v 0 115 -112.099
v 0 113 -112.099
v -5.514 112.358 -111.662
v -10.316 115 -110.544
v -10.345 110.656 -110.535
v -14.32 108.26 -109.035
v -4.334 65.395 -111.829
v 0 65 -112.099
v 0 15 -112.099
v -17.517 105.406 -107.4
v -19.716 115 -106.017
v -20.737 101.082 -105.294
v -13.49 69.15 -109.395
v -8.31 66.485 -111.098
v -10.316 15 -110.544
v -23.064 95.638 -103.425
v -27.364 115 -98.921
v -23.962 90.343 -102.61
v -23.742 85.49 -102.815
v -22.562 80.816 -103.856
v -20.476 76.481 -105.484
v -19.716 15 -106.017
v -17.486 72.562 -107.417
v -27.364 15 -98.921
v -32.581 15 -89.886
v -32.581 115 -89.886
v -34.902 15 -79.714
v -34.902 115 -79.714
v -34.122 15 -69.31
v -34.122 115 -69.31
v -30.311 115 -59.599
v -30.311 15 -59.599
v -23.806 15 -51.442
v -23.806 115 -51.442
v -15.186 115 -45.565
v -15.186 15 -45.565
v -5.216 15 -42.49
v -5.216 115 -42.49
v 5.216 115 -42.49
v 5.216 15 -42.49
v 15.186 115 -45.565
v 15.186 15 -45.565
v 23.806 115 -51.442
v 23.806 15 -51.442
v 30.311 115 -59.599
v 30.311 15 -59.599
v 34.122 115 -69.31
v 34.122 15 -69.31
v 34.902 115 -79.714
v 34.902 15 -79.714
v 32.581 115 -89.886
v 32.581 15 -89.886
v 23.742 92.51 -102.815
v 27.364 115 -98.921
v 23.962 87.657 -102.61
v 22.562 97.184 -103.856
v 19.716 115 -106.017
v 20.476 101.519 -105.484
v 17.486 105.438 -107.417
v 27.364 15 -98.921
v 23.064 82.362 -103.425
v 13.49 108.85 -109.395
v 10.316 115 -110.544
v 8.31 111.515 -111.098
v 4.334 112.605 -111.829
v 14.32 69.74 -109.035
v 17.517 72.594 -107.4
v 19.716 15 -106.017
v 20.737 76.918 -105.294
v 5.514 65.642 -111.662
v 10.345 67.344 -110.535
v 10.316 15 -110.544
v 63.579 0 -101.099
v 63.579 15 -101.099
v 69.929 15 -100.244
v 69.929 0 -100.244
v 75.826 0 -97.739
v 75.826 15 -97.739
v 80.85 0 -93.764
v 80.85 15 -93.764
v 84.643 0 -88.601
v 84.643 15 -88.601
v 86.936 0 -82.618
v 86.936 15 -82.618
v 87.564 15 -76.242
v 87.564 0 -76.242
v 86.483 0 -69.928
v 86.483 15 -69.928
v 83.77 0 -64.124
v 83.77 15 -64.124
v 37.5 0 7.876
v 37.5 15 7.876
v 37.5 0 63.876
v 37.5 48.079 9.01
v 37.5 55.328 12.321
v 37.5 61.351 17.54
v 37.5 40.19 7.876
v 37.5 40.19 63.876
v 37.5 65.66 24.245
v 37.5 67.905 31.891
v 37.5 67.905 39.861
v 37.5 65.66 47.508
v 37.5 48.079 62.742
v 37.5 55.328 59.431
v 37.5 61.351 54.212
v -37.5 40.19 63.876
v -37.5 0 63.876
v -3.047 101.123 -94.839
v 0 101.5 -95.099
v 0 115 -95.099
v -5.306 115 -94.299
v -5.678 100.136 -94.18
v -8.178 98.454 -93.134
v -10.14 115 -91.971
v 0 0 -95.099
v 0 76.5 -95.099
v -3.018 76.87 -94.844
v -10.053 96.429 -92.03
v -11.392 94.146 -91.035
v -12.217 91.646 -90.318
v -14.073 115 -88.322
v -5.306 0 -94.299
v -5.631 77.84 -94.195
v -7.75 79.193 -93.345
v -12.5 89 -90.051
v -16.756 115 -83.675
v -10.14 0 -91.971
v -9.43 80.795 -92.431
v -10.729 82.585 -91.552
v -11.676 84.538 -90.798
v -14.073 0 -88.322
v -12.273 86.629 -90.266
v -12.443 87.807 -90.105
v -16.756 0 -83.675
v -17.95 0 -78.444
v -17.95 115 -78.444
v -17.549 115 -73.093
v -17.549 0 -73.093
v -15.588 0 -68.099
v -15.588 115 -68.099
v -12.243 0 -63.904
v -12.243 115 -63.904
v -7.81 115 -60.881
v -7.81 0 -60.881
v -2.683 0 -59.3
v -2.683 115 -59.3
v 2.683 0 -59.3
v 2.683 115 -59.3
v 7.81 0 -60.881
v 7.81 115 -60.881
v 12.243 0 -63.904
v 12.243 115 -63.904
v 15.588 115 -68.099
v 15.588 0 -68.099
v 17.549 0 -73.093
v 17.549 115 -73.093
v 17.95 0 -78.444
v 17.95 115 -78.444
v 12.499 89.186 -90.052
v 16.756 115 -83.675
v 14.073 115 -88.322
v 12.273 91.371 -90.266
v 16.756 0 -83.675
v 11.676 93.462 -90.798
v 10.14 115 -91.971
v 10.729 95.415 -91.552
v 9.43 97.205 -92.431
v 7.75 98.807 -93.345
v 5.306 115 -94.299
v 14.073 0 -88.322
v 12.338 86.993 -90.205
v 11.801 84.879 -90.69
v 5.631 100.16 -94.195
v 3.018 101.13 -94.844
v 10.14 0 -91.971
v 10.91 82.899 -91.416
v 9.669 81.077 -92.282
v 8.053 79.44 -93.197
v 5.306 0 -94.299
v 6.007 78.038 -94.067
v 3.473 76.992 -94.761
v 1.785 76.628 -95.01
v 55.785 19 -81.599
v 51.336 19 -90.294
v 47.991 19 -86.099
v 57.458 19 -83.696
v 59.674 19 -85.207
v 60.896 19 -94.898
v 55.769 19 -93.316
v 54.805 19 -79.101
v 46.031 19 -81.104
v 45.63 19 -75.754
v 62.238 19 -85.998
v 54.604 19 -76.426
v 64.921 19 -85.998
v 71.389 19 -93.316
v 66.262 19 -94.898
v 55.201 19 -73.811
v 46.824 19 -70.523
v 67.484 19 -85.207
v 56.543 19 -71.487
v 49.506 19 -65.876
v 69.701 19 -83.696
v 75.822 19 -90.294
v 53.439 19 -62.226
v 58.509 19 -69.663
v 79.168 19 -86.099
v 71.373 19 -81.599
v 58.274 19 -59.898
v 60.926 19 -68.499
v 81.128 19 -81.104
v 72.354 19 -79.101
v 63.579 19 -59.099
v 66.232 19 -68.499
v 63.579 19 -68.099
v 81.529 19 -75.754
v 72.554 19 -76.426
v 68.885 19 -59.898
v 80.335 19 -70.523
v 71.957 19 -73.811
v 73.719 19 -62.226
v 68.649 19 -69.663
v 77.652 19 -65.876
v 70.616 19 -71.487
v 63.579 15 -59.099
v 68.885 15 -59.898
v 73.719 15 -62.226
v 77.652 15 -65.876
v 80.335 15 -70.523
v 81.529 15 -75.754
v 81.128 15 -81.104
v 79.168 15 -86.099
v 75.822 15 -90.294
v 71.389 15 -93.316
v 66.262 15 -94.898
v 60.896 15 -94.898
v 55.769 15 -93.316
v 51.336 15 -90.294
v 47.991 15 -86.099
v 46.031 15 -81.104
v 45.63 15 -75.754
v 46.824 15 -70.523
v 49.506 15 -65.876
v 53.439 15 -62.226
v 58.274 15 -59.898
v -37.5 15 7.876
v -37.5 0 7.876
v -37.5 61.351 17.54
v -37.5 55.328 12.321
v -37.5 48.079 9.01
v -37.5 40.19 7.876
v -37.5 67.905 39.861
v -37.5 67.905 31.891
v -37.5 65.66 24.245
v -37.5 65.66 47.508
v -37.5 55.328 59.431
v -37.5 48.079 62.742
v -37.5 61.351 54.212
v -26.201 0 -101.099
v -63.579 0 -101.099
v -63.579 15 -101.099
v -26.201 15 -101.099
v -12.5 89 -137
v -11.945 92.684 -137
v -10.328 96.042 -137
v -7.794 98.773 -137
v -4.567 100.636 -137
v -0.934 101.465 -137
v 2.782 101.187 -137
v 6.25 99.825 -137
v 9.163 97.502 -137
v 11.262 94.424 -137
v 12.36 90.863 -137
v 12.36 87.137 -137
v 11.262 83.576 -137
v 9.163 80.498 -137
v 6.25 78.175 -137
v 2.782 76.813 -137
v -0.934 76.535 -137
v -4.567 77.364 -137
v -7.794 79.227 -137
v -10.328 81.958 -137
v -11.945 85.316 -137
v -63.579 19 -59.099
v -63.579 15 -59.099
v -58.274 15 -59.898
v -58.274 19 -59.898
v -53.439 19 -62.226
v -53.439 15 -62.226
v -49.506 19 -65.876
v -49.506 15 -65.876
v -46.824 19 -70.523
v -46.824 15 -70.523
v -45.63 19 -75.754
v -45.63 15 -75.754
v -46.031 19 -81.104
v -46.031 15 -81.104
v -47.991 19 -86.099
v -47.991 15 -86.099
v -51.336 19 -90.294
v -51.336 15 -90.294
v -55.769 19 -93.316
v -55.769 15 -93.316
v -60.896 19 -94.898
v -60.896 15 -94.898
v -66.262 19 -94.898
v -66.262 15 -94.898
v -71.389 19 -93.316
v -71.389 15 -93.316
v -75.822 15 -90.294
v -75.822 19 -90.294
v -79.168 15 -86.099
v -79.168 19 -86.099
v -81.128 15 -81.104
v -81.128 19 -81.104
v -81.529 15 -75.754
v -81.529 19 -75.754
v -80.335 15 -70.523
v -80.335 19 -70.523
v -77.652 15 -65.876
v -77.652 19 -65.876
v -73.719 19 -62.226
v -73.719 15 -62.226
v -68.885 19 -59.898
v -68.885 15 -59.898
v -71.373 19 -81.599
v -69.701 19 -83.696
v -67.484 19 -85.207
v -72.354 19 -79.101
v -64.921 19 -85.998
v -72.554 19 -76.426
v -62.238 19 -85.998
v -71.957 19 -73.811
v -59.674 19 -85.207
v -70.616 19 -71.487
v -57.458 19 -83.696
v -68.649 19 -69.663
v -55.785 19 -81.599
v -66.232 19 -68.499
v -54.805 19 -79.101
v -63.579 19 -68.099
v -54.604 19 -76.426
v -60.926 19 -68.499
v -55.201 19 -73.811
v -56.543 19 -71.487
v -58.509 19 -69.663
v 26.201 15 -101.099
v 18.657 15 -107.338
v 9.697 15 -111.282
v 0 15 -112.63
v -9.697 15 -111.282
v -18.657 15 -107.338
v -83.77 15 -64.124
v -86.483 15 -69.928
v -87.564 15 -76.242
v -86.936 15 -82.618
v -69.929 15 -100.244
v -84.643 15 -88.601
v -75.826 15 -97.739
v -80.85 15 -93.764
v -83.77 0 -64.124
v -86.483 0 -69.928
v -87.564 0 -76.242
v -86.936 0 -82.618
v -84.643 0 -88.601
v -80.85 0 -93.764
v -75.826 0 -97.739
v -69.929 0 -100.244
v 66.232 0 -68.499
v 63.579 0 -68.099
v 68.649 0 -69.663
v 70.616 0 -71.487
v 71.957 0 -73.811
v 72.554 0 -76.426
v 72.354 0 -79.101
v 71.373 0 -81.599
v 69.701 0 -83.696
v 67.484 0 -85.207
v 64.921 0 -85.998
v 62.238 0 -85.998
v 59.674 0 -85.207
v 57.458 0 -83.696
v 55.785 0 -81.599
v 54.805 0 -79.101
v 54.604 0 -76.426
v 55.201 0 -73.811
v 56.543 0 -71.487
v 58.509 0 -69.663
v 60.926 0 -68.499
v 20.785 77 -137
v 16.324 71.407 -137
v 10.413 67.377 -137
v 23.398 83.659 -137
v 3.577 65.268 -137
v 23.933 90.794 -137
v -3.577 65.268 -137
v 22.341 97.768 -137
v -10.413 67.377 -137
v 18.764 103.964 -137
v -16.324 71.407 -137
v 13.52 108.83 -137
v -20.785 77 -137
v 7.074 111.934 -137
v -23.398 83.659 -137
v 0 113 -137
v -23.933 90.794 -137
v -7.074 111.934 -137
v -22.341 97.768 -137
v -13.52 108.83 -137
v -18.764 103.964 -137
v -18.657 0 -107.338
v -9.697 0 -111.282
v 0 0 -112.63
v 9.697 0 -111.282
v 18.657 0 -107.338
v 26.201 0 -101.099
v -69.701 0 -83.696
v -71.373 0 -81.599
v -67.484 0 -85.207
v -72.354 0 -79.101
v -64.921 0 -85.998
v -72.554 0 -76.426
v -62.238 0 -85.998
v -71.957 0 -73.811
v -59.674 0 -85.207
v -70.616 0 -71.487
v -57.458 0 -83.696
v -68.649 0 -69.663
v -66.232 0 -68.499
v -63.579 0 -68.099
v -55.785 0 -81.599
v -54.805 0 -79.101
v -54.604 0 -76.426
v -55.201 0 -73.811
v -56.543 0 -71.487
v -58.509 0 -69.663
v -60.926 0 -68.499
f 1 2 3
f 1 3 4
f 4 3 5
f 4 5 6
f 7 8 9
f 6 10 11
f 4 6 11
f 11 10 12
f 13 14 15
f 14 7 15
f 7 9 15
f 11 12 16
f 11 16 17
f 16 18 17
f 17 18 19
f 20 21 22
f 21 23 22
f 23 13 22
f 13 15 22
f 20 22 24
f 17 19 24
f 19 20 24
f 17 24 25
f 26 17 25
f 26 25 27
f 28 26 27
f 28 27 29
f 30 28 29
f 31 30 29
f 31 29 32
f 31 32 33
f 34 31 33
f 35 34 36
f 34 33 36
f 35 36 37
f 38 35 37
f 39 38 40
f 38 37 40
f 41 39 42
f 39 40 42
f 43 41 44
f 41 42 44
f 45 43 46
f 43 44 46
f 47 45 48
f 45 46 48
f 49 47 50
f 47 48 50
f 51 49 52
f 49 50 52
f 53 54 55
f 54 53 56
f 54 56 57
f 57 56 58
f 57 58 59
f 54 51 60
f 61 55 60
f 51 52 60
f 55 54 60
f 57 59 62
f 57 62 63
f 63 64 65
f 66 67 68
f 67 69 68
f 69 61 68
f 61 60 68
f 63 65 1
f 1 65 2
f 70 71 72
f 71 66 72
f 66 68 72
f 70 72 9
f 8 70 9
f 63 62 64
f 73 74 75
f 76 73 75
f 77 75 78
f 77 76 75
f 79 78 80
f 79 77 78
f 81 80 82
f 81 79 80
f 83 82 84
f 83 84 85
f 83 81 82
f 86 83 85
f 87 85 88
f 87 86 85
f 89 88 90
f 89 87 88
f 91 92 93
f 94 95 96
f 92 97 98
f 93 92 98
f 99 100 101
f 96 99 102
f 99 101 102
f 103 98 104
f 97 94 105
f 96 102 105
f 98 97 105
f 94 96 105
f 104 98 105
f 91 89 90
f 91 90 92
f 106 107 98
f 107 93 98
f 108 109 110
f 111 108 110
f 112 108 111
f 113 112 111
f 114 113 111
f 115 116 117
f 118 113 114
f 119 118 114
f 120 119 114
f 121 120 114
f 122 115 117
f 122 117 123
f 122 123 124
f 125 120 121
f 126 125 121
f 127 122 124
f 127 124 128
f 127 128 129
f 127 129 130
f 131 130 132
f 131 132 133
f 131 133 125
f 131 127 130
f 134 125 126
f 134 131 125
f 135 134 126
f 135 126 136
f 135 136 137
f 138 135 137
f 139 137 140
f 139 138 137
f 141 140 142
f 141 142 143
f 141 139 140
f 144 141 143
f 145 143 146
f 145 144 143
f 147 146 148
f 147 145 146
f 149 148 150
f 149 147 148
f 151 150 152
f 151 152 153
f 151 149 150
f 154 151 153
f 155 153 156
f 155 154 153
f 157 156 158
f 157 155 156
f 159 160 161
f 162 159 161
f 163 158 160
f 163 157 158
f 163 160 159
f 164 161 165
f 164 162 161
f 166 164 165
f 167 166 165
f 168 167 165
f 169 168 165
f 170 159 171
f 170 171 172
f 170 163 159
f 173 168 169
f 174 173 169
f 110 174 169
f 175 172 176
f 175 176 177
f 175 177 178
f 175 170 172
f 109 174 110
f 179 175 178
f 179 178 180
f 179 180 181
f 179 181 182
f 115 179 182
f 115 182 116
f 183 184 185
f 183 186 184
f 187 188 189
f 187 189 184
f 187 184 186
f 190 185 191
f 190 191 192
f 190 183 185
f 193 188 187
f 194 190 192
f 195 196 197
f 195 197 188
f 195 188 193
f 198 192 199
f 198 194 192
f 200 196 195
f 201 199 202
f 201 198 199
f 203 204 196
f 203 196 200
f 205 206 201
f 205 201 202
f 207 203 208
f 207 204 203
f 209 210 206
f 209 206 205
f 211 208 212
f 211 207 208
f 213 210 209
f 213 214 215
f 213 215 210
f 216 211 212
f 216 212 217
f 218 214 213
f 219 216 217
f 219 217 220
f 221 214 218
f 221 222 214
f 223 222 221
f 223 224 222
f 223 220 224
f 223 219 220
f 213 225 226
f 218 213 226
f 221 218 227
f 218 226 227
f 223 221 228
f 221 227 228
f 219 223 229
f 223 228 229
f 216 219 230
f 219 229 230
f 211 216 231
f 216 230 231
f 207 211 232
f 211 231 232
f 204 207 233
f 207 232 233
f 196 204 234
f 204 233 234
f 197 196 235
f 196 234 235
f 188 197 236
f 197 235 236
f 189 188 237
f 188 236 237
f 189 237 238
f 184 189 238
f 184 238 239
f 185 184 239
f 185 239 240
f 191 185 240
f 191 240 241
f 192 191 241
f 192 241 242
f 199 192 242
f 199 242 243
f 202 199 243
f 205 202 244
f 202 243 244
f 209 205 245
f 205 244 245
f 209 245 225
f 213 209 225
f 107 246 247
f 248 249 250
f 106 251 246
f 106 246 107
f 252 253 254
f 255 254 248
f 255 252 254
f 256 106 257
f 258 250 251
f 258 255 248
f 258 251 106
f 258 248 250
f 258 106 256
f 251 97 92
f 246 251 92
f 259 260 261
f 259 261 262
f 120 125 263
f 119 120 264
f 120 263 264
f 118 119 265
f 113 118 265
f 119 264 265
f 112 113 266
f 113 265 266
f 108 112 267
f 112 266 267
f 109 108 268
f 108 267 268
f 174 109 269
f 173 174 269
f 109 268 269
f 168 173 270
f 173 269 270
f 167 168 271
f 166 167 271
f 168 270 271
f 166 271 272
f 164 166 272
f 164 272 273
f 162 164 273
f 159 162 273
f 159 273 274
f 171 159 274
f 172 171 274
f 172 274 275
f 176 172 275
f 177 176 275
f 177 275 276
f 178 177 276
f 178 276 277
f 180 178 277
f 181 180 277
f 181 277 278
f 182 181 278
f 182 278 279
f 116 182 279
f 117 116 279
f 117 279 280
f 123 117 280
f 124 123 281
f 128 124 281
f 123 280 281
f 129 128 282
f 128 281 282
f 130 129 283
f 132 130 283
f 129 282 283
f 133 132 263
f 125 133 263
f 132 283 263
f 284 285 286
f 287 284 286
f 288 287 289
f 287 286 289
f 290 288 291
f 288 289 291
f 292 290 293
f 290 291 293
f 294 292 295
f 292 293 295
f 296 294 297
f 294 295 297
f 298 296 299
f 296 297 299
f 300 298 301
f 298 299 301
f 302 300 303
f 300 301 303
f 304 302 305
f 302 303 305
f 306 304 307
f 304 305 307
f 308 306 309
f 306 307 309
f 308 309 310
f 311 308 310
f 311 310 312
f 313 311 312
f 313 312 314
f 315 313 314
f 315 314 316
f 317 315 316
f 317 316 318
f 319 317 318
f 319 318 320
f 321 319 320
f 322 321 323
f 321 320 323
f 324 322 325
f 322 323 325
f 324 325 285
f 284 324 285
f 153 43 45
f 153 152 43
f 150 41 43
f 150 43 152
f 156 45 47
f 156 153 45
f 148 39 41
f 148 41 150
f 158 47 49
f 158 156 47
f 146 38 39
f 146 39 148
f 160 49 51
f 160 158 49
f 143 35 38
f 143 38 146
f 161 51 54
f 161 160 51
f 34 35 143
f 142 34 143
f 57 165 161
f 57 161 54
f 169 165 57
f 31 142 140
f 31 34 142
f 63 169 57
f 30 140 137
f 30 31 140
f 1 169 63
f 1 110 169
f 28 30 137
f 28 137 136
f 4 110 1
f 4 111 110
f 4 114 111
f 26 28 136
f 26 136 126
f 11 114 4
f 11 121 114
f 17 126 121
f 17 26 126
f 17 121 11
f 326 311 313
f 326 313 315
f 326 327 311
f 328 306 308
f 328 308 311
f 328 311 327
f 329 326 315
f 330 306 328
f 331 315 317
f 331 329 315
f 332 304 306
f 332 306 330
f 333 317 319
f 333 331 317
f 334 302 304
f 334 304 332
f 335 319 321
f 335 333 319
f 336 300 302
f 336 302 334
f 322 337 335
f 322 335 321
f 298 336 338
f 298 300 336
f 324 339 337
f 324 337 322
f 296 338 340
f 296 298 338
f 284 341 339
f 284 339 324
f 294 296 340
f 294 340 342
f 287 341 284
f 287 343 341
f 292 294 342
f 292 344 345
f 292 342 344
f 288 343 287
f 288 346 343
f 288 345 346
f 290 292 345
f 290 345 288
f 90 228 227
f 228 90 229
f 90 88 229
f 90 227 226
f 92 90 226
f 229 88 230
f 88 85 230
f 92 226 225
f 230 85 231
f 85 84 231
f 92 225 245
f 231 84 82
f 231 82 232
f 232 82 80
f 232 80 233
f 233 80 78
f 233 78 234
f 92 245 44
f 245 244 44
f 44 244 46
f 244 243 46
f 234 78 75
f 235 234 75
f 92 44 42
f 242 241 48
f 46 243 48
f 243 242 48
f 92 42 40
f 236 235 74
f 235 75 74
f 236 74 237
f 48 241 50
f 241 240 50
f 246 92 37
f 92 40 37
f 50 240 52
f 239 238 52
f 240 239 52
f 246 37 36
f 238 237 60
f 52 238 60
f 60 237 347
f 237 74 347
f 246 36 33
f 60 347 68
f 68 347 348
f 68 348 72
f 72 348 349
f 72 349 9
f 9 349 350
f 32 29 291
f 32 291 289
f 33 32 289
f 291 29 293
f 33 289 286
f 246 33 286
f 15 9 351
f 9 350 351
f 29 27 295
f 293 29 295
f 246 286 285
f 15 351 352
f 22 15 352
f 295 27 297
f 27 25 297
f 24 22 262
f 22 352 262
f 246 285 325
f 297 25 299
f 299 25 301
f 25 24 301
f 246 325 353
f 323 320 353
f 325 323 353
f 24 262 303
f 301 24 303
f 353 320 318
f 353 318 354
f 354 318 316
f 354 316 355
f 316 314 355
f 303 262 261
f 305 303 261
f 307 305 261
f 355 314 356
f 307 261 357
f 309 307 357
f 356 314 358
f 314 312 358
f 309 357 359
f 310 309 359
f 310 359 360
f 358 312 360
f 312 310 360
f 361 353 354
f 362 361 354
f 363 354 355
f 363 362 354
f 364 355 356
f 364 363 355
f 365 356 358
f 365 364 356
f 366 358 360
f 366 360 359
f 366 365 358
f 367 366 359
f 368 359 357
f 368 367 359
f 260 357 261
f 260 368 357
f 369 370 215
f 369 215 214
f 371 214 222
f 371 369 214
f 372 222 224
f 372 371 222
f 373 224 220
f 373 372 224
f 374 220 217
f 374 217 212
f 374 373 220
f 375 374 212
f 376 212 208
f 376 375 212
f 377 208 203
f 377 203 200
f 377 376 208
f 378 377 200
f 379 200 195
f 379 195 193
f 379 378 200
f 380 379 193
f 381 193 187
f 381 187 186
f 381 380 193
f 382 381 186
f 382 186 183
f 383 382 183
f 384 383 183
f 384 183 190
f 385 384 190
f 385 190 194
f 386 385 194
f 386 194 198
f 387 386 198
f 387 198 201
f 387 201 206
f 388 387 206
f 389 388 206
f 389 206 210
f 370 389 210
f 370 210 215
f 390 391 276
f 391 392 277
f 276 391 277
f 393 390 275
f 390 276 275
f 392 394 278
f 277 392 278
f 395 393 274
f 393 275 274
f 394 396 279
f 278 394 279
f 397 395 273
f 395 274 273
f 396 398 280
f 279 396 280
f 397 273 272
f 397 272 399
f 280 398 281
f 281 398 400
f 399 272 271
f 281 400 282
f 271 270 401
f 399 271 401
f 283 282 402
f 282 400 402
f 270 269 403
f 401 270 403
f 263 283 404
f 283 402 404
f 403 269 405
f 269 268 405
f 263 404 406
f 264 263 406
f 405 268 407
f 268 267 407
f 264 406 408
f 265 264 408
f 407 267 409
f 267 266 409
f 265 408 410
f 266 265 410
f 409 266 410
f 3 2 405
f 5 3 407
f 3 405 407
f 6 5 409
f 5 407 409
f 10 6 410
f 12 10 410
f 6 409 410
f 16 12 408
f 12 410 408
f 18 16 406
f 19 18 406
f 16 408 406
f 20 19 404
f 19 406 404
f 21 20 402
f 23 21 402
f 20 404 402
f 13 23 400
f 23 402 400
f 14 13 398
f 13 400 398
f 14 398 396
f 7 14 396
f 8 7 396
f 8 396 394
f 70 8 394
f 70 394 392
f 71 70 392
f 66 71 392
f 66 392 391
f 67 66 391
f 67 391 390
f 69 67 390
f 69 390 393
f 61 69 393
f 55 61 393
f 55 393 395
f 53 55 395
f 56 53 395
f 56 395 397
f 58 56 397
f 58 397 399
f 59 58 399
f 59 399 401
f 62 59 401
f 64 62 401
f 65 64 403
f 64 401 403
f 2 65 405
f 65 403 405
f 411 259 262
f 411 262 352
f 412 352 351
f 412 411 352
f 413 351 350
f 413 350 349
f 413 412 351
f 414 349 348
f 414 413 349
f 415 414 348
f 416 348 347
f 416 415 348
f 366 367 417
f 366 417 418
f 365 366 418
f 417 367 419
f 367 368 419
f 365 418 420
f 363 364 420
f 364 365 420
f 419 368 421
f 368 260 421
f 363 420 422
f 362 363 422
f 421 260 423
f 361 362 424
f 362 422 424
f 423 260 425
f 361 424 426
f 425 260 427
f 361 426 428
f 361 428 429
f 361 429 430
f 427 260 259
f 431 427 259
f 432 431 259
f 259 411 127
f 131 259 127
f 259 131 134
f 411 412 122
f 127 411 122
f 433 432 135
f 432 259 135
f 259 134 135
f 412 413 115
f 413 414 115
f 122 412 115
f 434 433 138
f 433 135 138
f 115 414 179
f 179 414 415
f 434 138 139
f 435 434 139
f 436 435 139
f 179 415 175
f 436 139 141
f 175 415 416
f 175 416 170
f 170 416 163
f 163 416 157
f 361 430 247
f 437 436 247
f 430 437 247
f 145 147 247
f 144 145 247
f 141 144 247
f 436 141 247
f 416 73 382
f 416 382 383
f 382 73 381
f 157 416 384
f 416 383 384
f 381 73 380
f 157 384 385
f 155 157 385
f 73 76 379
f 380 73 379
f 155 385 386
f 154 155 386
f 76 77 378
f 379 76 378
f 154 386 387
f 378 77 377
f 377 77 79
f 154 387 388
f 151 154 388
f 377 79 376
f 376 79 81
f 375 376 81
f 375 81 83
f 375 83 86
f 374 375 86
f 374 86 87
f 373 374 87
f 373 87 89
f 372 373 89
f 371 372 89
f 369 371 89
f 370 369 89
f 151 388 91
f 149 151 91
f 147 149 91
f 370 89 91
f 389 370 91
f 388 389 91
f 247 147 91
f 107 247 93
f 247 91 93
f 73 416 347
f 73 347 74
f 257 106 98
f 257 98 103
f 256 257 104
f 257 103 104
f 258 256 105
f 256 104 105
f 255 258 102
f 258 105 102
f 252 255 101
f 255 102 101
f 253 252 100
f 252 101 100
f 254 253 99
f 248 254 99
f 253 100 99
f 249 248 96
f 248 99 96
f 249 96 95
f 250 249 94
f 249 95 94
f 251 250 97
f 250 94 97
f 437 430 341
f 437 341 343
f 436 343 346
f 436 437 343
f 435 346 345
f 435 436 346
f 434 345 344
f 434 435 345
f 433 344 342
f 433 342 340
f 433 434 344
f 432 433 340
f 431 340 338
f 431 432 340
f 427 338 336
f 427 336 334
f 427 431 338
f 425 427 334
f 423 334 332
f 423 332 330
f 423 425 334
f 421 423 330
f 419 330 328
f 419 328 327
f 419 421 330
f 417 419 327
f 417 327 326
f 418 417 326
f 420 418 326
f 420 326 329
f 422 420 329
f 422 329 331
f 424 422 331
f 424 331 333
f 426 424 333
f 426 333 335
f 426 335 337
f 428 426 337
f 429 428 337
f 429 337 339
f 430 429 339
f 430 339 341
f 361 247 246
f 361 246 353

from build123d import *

# Parameters (mm, degrees)
BOSS_EXTRUDE1_DEPTH       = 15
BOSS_EXTRUDE2_DEPTH       = 37.5
SKETCH8_R                 = 35
SKETCH8_R_2               = 18
BOSS_EXTRUDE13_DEPTH      = 100
CUT_EXTRUDE2_START        = -100
SKETCH13_R                = 18
CUT_EXTRUDE2_DEPTH        = 100
SKETCH14_R                = 18
SKETCH14_R_2              = 9
BOSS_EXTRUDE15_DEPTH      = 4
CUT_EXTRUDE3_START        = -50
SKETCH15_R                = 9
CUT_EXTRUDE3_DEPTH        = 50
BOSS_EXTRUDE16_REACH      = 249.48
BOSS_EXTRUDE16_END_RADIUS = 35
SKETCH18_R                = 24
SKETCH19_R                = 12.5
CUT_EXTRUDE4_DEPTH        = 50


with BuildPart() as part:
    # Sketch5 → Boss-Extrude1 (new body)
    with BuildSketch(Plane(origin=(0, 0, 0), x_dir=(1, 0, 0), z_dir=(0, 1, 0))):
        with BuildLine():
            Line((-37.5, -7.876252255), (-83.769584953, 64.123747745))
            ThreePointArc((-83.769584953, 64.123747745), (-84.643426785, 88.600912666), (-63.579244399, 101.098729377))
            Line((-63.579244399, 101.098729377), (-26.201026839, 101.098729377))
            ThreePointArc((-26.201026839, 101.098729377), (0, 112.630318244), (26.201026839, 101.098729377))
            Line((26.201026839, 101.098729377), (63.579244399, 101.098729377))
            ThreePointArc((63.579244399, 101.098729377), (84.643426785, 88.600912666), (83.769584953, 64.123747745))
            Line((83.769584953, 64.123747745), (37.5, -7.876252255))
            Line((37.5, -7.876252255), (-37.5, -7.876252255))
        make_face()
    extrude(amount=BOSS_EXTRUDE1_DEPTH)

    # Sketch7 → Boss-Extrude2 (add, symmetric)
    with BuildSketch(Plane(origin=(0, 0, 0), x_dir=(0, 0, -1), z_dir=(1, 0, 0))):
        with BuildLine():
            Line((-7.876252255, 0), (-63.876252255, 0))
            Line((-63.876252255, 0), (-63.876252255, 40.190310044))
            ThreePointArc((-63.876252255, 40.190310044), (-35.876252255, 68.190310044), (-7.876252255, 40.190310044))
            Line((-7.876252255, 40.190310044), (-7.876252255, 0))
        make_face()
    extrude(amount=BOSS_EXTRUDE2_DEPTH, both=True)

    # Sketch8 → Boss-Extrude13 (add)
    with BuildSketch(Plane(origin=(0, 15, 0), x_dir=(1, 0, 0), z_dir=(0, 1, 0))):
        with Locations(Location((0, 77.098729377, 0), (0, 0, 90))):
            Circle(SKETCH8_R)
        with Locations(Location((0, 77.098729377, 0), (0, 0, 90))):
            Circle(SKETCH8_R_2, mode=Mode.SUBTRACT)
    extrude(amount=BOSS_EXTRUDE13_DEPTH)

    # Sketch13 → Cut-Extrude2 (cut)
    with BuildSketch(Plane(origin=(0, 15, 0), x_dir=(1, 0, 0), z_dir=(0, 1, 0)).offset(CUT_EXTRUDE2_START)):
        with Locations(Location((0, 77.098729377, 0), (0, 0, 90))):
            Circle(SKETCH13_R)
    extrude(amount=CUT_EXTRUDE2_DEPTH, mode=Mode.SUBTRACT)

    # Sketch14 → Boss-Extrude15 (add)
    # profile 1 of 2: a face of its own
    with BuildSketch(Plane(origin=(0, 15, 0), x_dir=(1, 0, 0), z_dir=(0, 1, 0))):
        with Locations(Location((-63.579244399, 77.098729377, 0), (0, 0, 270))):
            Circle(SKETCH14_R)
        with Locations(Location((-63.579244399, 77.098729377, 0), (0, 0, 270))):
            Circle(SKETCH14_R_2, mode=Mode.SUBTRACT)
    # profile 2 of 2: a face of its own
    with BuildSketch(Plane(origin=(0, 15, 0), x_dir=(1, 0, 0), z_dir=(0, 1, 0))):
        with Locations(Location((63.579244399, 77.098729377, 0), (0, 0, 270))):
            Circle(SKETCH14_R)
        with Locations(Location((63.579244399, 77.098729377, 0), (0, 0, 270))):
            Circle(SKETCH14_R_2, mode=Mode.SUBTRACT)
    extrude(amount=BOSS_EXTRUDE15_DEPTH)

    # Sketch15 → Cut-Extrude3 (cut)
    with BuildSketch(Plane(origin=(0, 15, 0), x_dir=(1, 0, 0), z_dir=(0, 1, 0)).offset(CUT_EXTRUDE3_START)):
        with Locations(Location((-63.579244399, 77.098729377, 0), (0, 0, 270))):
            Circle(SKETCH15_R)
        with Locations(Location((63.579244399, 77.098729377, 0), (0, 0, 270))):
            Circle(SKETCH15_R)
    extrude(amount=CUT_EXTRUDE3_DEPTH, mode=Mode.SUBTRACT)

    # Boss-Extrude16: up to this cylinder (the profile starts outside it)
    boss_extrude16_end = Plane(origin=(0, 89, -77.098729377), z_dir=(0, -1, 0)) * Cylinder(BOSS_EXTRUDE16_END_RADIUS, 569.96, mode=Mode.PRIVATE)
    # Sketch18 → Boss-Extrude16 (add, up to the surface)
    with BuildSketch(Plane.XY.offset(-137), mode=Mode.PRIVATE) as boss_extrude16_sk1:
        with Locations(Location((0, 89, 0), (0, 0, 90))):
            Circle(SKETCH18_R)
    boss_extrude16_tool1 = extrude(boss_extrude16_sk1.sketch, amount=BOSS_EXTRUDE16_REACH, mode=Mode.PRIVATE) - boss_extrude16_end
    add(boss_extrude16_tool1.solids().sort_by_distance((0, 89, -137))[0])

    # Sketch19 → Cut-Extrude4 (cut)
    with BuildSketch(Plane(origin=(0, 0, -137), x_dir=(-1, 0, 0), z_dir=(0, 0, -1))):
        with Locations((0, 89)):
            Circle(SKETCH19_R)
    extrude(amount=-CUT_EXTRUDE4_DEPTH, mode=Mode.SUBTRACT)


solid = part.part
